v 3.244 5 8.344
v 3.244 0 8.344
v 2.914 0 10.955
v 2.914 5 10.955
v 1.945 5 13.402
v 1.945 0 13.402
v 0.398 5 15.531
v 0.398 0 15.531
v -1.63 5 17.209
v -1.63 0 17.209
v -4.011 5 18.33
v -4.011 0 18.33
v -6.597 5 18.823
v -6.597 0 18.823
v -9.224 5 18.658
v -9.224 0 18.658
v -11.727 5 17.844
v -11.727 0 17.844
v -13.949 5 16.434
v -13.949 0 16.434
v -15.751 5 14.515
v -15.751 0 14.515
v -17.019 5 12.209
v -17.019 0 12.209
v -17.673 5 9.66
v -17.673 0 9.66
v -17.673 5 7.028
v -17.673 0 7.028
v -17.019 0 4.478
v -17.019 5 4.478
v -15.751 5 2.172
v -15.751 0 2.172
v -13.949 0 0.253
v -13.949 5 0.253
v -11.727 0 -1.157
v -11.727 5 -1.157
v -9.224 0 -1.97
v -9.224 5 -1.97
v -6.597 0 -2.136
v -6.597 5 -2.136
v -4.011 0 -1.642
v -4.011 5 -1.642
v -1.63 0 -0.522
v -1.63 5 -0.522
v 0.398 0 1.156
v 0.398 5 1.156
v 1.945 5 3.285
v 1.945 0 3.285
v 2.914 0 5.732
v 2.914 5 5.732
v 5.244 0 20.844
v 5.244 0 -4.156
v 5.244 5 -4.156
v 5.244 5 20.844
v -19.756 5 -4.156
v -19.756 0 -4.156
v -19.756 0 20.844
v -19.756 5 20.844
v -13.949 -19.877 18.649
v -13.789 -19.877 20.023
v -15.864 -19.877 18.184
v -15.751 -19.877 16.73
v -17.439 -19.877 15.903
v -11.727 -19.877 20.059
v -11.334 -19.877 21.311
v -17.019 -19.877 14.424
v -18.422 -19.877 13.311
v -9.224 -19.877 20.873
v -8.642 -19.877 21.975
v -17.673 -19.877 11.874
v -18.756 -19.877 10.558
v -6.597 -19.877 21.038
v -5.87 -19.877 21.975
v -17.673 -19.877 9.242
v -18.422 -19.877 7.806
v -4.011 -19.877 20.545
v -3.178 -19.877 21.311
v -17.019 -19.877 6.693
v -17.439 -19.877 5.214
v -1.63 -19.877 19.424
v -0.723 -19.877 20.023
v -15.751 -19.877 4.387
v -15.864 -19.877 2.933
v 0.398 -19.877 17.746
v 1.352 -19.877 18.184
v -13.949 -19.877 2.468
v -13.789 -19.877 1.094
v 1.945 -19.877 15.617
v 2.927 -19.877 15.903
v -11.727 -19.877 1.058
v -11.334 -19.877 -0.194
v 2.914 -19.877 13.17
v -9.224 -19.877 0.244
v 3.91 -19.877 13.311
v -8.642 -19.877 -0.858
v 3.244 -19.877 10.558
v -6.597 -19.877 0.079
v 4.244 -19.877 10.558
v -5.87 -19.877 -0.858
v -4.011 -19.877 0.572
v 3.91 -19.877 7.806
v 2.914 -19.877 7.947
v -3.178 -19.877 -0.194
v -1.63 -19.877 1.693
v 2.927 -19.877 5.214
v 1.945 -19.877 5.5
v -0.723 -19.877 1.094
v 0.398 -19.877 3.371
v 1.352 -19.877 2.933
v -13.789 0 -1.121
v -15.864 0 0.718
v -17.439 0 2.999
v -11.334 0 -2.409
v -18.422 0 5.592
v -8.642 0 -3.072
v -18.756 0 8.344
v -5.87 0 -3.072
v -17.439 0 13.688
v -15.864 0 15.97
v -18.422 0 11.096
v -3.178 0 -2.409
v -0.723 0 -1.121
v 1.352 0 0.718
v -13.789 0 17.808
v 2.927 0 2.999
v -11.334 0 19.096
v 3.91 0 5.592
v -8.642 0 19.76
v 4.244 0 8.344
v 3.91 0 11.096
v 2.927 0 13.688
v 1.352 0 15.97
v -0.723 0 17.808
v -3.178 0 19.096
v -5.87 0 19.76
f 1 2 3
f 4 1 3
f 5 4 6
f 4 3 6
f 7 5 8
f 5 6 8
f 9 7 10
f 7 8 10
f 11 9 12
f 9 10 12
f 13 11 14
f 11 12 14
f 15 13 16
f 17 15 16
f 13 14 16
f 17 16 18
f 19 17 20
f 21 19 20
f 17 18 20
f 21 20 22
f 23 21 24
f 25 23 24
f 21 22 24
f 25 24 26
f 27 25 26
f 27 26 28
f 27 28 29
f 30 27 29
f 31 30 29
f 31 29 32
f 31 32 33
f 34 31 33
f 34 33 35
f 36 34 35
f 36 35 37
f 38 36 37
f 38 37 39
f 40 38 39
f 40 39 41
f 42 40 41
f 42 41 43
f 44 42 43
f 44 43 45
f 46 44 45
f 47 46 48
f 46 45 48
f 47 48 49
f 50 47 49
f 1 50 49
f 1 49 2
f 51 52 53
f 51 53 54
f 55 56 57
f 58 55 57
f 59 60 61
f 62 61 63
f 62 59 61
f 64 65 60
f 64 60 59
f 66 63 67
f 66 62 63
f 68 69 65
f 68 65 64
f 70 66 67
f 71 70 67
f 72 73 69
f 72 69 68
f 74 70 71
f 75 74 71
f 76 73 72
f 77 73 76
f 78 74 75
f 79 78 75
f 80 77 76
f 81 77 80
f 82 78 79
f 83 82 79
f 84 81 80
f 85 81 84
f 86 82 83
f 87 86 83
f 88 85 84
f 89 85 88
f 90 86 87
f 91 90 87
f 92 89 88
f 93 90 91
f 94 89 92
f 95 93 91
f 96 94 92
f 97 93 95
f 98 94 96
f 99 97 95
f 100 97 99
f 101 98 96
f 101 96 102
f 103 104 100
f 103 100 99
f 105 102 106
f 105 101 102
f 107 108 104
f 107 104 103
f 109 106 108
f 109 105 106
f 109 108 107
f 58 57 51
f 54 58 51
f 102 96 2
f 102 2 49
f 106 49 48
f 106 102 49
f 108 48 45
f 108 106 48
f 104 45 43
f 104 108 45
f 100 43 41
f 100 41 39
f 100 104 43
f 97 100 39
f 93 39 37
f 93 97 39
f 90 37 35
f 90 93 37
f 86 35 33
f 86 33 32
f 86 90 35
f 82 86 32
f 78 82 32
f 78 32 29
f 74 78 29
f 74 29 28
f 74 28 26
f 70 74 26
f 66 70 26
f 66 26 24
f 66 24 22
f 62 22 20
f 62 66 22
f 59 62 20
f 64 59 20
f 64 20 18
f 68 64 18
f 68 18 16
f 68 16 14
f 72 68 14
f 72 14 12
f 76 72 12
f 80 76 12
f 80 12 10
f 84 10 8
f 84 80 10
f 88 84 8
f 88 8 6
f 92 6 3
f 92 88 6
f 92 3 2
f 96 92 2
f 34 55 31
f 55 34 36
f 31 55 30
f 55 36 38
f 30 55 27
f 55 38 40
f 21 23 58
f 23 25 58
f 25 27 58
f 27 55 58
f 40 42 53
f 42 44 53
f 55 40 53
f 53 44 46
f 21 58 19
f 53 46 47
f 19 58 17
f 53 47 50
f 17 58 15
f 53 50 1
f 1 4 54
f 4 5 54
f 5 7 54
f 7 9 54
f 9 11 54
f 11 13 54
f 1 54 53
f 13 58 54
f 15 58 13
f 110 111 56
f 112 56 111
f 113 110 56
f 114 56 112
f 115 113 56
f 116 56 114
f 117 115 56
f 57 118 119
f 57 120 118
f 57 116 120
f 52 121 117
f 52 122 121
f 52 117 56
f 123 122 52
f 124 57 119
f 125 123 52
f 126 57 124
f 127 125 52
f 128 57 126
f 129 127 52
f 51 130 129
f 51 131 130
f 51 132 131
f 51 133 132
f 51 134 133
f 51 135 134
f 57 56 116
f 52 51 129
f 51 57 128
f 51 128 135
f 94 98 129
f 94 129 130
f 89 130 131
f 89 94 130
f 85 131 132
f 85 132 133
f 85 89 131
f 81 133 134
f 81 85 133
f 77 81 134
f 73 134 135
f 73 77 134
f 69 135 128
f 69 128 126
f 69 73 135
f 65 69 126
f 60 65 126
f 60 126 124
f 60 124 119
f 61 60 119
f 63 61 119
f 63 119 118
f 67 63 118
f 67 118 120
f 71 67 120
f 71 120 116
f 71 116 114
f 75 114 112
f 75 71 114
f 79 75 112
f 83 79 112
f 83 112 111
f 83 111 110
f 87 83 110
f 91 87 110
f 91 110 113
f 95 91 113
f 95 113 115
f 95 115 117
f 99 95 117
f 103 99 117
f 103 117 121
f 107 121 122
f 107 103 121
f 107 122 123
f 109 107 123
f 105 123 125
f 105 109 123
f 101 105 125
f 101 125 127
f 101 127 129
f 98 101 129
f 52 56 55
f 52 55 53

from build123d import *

# Parameters (mm, degrees)
F1_R     = 11.5
F1_R_2   = 10.5
F0_W     = 25
F0_H     = 25
F4_DEPTH = 5
F5_R     = 10.5
F6_DEPTH = 5.001


with BuildPart() as f3:
    # F3: sweep along a path in F2
    with BuildLine(Plane.YZ) as f3_path:
        Line((0, 8.3436881795), (-19.8769871225, 10.5584980885))
    # F1 (on face) → F3 (sweep)
    with BuildSketch(Plane.XZ):
        with Locations((-7.256067358, 8.3436881795)):
            Circle(F1_R)
        with Locations((-7.256067358, 8.3436881795)):
            Circle(F1_R_2, mode=Mode.SUBTRACT)
    sweep(path=f3_path.line)

    # F0 (on Front) → F4 (join)
    with BuildSketch(Plane.XZ):
        with Locations((-7.256067358, 8.3436881795)):
            Rectangle(F0_W, F0_H)
    extrude(amount=-F4_DEPTH)

    # F5 (on face) → F6 (cut, through all)
    with BuildSketch(Plane.XZ):
        with Locations((-7.256067358, 8.3436881795)):
            Circle(F5_R)
    extrude(amount=-F6_DEPTH, mode=Mode.SUBTRACT)


solid = f3.part
